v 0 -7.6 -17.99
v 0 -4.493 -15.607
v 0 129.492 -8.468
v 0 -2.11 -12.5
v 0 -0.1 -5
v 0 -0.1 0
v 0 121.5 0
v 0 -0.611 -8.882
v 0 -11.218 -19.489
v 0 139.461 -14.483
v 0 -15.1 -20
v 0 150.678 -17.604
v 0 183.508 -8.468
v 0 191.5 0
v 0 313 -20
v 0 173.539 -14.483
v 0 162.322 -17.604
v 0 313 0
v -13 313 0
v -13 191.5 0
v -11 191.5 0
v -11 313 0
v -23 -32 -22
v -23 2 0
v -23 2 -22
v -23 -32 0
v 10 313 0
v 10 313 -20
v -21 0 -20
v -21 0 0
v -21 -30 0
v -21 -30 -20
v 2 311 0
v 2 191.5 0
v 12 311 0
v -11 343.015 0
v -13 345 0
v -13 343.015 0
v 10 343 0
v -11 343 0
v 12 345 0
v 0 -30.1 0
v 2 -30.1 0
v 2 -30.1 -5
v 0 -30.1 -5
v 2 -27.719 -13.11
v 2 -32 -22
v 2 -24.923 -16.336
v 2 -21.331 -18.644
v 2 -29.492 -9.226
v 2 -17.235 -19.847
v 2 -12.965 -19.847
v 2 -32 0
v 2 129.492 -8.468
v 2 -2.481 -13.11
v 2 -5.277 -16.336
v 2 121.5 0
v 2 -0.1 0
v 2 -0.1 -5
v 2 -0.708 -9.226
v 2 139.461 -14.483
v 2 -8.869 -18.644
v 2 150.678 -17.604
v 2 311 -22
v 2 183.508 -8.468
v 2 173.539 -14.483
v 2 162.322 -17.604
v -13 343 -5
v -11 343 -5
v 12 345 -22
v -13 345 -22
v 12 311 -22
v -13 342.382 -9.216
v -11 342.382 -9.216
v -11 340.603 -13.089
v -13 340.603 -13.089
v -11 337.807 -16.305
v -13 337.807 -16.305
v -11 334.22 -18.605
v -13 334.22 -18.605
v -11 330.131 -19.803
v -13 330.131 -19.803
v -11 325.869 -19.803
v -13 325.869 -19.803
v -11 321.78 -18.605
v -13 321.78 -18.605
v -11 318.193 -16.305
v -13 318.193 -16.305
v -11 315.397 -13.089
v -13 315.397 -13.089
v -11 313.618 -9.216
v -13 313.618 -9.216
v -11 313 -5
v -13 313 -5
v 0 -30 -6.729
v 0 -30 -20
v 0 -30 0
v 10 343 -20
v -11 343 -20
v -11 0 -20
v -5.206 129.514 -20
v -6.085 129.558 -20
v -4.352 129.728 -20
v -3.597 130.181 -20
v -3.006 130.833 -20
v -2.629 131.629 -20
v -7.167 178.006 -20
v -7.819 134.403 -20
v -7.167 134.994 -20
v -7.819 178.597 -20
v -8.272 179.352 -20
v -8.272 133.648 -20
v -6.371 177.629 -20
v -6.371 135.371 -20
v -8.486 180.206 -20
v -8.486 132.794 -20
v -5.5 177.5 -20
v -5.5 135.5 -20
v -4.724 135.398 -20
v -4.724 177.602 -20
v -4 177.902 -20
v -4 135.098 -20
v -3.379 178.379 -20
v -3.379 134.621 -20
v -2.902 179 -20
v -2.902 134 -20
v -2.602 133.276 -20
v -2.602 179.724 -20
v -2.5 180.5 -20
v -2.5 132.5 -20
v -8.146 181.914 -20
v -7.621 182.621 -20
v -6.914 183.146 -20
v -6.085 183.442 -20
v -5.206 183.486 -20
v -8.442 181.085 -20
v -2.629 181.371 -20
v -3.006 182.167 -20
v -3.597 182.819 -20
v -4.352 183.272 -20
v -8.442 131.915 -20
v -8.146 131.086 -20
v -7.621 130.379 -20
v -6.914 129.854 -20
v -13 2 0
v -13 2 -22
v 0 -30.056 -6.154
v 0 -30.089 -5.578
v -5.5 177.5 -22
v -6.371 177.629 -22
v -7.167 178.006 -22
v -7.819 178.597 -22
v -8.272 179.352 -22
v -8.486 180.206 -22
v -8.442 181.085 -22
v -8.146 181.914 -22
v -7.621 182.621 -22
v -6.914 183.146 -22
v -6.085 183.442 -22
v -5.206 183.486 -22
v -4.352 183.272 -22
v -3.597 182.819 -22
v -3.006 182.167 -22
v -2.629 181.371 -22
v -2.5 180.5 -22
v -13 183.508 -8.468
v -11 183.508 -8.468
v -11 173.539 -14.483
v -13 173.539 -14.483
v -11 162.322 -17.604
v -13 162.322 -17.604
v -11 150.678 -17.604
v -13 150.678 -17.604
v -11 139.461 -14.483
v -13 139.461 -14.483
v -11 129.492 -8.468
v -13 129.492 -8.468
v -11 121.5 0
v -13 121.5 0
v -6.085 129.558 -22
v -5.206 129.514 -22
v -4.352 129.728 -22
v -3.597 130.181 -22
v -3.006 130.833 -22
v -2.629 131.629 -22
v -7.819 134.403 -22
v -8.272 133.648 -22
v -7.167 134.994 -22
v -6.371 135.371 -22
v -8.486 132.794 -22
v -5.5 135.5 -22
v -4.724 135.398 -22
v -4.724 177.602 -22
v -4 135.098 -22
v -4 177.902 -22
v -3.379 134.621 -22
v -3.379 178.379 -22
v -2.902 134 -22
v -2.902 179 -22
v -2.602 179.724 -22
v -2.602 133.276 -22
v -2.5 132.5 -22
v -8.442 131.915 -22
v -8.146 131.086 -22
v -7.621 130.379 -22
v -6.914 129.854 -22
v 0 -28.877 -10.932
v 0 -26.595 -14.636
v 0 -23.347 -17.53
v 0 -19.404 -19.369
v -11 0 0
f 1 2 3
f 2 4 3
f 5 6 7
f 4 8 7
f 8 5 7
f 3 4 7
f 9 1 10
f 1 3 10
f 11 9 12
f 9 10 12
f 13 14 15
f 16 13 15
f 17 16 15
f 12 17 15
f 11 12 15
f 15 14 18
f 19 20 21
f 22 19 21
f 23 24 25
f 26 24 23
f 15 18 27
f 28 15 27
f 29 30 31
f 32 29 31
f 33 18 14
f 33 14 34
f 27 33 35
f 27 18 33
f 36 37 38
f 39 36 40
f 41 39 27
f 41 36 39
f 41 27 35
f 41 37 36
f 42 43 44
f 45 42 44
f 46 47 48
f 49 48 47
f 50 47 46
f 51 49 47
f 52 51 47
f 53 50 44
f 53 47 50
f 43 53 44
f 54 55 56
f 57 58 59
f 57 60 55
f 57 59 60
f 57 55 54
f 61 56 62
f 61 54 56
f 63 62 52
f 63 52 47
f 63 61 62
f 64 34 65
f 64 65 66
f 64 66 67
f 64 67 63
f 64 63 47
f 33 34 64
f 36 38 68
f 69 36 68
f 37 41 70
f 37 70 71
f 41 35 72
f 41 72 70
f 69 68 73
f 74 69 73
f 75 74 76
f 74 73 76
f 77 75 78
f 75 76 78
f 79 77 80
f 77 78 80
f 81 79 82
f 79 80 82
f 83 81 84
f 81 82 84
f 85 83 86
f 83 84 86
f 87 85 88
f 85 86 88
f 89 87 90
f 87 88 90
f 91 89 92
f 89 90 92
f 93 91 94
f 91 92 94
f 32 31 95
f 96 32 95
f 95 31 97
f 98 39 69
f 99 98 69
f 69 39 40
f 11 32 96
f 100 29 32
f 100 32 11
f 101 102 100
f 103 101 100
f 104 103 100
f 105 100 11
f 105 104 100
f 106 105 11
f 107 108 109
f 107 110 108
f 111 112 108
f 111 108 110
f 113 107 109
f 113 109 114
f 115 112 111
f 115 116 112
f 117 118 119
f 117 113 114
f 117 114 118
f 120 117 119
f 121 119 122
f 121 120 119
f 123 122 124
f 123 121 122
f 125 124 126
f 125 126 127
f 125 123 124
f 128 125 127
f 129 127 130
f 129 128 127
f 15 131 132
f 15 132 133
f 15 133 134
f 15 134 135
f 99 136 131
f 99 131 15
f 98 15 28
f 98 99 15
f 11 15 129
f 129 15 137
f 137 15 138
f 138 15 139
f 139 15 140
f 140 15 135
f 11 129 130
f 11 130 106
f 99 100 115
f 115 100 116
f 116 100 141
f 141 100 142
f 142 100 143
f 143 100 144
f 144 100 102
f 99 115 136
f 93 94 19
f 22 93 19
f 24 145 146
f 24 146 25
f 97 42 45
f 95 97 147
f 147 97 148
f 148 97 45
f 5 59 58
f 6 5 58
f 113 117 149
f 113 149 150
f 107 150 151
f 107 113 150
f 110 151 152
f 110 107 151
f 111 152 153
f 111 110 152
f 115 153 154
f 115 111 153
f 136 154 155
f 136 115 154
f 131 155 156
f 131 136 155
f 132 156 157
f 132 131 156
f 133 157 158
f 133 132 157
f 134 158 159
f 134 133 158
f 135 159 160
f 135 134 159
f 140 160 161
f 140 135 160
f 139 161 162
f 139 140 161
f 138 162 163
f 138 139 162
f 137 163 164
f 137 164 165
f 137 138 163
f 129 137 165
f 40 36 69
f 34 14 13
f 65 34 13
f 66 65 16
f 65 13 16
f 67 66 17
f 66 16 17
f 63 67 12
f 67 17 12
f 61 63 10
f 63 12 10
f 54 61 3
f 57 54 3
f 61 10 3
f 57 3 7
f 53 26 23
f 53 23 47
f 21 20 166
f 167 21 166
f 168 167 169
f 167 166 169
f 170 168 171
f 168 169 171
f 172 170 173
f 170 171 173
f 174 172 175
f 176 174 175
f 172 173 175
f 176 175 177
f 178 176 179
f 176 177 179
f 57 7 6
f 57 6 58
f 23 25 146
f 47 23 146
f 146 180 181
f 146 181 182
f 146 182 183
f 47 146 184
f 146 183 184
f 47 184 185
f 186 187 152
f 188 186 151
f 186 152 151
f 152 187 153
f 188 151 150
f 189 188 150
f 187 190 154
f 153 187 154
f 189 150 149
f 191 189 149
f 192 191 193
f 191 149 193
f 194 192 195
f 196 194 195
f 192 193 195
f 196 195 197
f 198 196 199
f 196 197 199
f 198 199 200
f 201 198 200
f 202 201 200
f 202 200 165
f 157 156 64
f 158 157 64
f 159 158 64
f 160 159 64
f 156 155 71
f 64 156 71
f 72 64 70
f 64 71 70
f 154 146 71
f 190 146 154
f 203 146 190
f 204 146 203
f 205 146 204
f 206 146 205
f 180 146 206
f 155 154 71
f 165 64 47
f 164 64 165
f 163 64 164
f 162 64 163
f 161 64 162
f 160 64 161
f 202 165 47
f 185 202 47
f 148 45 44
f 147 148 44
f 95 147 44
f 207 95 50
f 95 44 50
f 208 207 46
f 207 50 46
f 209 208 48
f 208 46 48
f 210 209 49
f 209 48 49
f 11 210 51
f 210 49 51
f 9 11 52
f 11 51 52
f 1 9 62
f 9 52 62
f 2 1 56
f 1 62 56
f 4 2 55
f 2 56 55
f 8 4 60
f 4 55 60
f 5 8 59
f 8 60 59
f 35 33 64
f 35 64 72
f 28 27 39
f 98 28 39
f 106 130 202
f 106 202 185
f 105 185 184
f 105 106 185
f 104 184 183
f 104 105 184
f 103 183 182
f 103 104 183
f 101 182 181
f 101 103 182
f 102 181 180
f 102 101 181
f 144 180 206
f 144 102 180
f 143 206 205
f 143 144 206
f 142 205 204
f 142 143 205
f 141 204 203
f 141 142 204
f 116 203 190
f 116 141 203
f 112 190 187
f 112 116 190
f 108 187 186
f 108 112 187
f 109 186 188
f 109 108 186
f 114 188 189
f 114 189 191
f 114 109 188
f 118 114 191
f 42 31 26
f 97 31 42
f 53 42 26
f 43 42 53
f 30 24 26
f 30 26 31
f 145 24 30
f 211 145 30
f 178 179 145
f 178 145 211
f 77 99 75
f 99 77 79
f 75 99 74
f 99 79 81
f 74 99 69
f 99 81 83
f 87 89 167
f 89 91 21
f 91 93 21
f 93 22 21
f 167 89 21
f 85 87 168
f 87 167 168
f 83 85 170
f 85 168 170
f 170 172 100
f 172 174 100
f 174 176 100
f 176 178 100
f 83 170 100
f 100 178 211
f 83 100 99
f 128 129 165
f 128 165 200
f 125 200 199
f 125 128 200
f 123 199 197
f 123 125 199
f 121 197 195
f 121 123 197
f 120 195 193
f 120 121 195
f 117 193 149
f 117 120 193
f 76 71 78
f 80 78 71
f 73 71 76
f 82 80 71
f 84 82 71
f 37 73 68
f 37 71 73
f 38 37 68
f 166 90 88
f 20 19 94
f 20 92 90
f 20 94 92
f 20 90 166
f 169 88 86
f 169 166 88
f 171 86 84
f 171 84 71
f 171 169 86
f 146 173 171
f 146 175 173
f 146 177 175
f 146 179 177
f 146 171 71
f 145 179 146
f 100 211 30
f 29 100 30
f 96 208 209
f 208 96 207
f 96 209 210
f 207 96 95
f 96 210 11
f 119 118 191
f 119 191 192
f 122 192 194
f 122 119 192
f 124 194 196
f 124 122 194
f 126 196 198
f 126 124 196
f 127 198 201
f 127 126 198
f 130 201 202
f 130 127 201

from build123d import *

# Parameters (mm, degrees)
F1_DEPTH = 22
F3_DEPTH = 20
F5_DEPTH = 2
F6_DEPTH = 2
F7_DEPTH = 22
F9_DEPTH = 15


# Not quite as in the source:
# - a feature names something its author has since deleted; it is built from what else it names


with BuildPart() as f1:
    # F0 (on Top) → F1 (new body)
    with BuildSketch(Plane.XY):
        Polygon((-13, 345), (-13, 156.5), (-13, 2), (-23, 2), (-23, -32), (2, -32), (2, 311), (12, 311), (12, 345), align=None)
        Polygon((10, 313), (0, 313), (0, -30), (-21, -30), (-21, 0), (-11, 0), (-11, 156.5), (-11, 343), (10, 343), align=None, mode=Mode.SUBTRACT)
        Polygon((0, -30), (0, 313), (10, 313), (10, 343), (-11, 343), (-11, 156.5), (-11, 0), (-21, 0), (-21, -30), align=None)
        with BuildLine():
            ThreePointArc((-2.4999999702, 132.5), (-7.6213203138, 130.3786796564), (-5.4999999702, 135.5))
            ThreePointArc((-5.4999999702, 135.5), (-3.3786796266, 134.6213203436), (-2.4999999702, 132.5))
        make_face(mode=Mode.SUBTRACT)
        with BuildLine():
            ThreePointArc((-2.4999999702, 180.5), (-3.3786796266, 178.3786796564), (-5.4999999702, 177.5))
            ThreePointArc((-5.4999999702, 177.5), (-7.6213203138, 182.6213203436), (-2.4999999702, 180.5))
        make_face(mode=Mode.SUBTRACT)
    extrude(amount=-F1_DEPTH)

    # F0 (on Top) → F3 (cut)
    with BuildSketch(Plane.XY):
        Polygon((0, -30), (0, 313), (10, 313), (10, 343), (-11, 343), (-11, 156.5), (-11, 0), (-21, 0), (-21, -30), align=None)
        with BuildLine():
            ThreePointArc((-2.4999999702, 132.5), (-7.6213203138, 130.3786796564), (-5.4999999702, 135.5))
            ThreePointArc((-5.4999999702, 135.5), (-3.3786796266, 134.6213203436), (-2.4999999702, 132.5))
        make_face(mode=Mode.SUBTRACT)
        with BuildLine():
            ThreePointArc((-2.4999999702, 180.5), (-3.3786796266, 178.3786796564), (-5.4999999702, 177.5))
            ThreePointArc((-5.4999999702, 177.5), (-7.6213203138, 182.6213203436), (-2.4999999702, 180.5))
        make_face(mode=Mode.SUBTRACT)
    extrude(amount=-F3_DEPTH, mode=Mode.SUBTRACT)

    # F4 (on face) → F5 (cut)
    with BuildSketch(Plane.YZ.offset(2)):
        with BuildLine():
            Line((-0.1, 0), (-30.1, 0))
            Line((-30.1, 0), (-30.1, -5))
            ThreePointArc((-30.1, -5), (-15.1, -20), (-0.1, -5))
            Line((-0.1, -5), (-0.1, 0))
        make_face()
    extrude(amount=-F5_DEPTH, mode=Mode.SUBTRACT)

    # F2 (on face) → F6 (cut)
    with BuildSketch(Plane(origin=(-13, 0, 0), x_dir=(0, -1, 0), z_dir=(-1, 0, 0))):
        with BuildLine():
            Line((-343.0150201633, 0), (-343, -5))
            ThreePointArc((-343, -5), (-328.0000676811, -19.9549397135), (-313.0001353623, -5))
            Line((-313.0001353623, -5), (-313.0001353623, 0))
            Line((-313.0001353623, 0), (-343.0150201633, 0))
        make_face()
    extrude(amount=-F6_DEPTH, mode=Mode.SUBTRACT)

    # F0 (on Top) → F7 (cut)
    with BuildSketch(Plane.XY):
        with BuildLine():
            ThreePointArc((-2.4999999702, 180.5), (-7.6213203138, 182.6213203436), (-5.4999999702, 177.5))
            ThreePointArc((-5.4999999702, 177.5), (-3.3786796266, 178.3786796564), (-2.4999999702, 180.5))
        make_face()
    extrude(amount=-F7_DEPTH, mode=Mode.SUBTRACT)

    # F8 (on face) → F9 (cut)
    with BuildSketch(Plane(origin=(-13, 0, 0), x_dir=(0, -1, 0), z_dir=(-1, 0, 0))):
        with BuildLine():
            ThreePointArc((-191.5000676811, 0), (-156.5000676811, -18), (-121.5000676811, 0))
            Line((-121.5000676811, 0), (-156.5000676811, 0))
            Line((-156.5000676811, 0), (-191.5000676811, 0))
        make_face()
    extrude(amount=-F9_DEPTH, mode=Mode.SUBTRACT)


solid = f1.part
